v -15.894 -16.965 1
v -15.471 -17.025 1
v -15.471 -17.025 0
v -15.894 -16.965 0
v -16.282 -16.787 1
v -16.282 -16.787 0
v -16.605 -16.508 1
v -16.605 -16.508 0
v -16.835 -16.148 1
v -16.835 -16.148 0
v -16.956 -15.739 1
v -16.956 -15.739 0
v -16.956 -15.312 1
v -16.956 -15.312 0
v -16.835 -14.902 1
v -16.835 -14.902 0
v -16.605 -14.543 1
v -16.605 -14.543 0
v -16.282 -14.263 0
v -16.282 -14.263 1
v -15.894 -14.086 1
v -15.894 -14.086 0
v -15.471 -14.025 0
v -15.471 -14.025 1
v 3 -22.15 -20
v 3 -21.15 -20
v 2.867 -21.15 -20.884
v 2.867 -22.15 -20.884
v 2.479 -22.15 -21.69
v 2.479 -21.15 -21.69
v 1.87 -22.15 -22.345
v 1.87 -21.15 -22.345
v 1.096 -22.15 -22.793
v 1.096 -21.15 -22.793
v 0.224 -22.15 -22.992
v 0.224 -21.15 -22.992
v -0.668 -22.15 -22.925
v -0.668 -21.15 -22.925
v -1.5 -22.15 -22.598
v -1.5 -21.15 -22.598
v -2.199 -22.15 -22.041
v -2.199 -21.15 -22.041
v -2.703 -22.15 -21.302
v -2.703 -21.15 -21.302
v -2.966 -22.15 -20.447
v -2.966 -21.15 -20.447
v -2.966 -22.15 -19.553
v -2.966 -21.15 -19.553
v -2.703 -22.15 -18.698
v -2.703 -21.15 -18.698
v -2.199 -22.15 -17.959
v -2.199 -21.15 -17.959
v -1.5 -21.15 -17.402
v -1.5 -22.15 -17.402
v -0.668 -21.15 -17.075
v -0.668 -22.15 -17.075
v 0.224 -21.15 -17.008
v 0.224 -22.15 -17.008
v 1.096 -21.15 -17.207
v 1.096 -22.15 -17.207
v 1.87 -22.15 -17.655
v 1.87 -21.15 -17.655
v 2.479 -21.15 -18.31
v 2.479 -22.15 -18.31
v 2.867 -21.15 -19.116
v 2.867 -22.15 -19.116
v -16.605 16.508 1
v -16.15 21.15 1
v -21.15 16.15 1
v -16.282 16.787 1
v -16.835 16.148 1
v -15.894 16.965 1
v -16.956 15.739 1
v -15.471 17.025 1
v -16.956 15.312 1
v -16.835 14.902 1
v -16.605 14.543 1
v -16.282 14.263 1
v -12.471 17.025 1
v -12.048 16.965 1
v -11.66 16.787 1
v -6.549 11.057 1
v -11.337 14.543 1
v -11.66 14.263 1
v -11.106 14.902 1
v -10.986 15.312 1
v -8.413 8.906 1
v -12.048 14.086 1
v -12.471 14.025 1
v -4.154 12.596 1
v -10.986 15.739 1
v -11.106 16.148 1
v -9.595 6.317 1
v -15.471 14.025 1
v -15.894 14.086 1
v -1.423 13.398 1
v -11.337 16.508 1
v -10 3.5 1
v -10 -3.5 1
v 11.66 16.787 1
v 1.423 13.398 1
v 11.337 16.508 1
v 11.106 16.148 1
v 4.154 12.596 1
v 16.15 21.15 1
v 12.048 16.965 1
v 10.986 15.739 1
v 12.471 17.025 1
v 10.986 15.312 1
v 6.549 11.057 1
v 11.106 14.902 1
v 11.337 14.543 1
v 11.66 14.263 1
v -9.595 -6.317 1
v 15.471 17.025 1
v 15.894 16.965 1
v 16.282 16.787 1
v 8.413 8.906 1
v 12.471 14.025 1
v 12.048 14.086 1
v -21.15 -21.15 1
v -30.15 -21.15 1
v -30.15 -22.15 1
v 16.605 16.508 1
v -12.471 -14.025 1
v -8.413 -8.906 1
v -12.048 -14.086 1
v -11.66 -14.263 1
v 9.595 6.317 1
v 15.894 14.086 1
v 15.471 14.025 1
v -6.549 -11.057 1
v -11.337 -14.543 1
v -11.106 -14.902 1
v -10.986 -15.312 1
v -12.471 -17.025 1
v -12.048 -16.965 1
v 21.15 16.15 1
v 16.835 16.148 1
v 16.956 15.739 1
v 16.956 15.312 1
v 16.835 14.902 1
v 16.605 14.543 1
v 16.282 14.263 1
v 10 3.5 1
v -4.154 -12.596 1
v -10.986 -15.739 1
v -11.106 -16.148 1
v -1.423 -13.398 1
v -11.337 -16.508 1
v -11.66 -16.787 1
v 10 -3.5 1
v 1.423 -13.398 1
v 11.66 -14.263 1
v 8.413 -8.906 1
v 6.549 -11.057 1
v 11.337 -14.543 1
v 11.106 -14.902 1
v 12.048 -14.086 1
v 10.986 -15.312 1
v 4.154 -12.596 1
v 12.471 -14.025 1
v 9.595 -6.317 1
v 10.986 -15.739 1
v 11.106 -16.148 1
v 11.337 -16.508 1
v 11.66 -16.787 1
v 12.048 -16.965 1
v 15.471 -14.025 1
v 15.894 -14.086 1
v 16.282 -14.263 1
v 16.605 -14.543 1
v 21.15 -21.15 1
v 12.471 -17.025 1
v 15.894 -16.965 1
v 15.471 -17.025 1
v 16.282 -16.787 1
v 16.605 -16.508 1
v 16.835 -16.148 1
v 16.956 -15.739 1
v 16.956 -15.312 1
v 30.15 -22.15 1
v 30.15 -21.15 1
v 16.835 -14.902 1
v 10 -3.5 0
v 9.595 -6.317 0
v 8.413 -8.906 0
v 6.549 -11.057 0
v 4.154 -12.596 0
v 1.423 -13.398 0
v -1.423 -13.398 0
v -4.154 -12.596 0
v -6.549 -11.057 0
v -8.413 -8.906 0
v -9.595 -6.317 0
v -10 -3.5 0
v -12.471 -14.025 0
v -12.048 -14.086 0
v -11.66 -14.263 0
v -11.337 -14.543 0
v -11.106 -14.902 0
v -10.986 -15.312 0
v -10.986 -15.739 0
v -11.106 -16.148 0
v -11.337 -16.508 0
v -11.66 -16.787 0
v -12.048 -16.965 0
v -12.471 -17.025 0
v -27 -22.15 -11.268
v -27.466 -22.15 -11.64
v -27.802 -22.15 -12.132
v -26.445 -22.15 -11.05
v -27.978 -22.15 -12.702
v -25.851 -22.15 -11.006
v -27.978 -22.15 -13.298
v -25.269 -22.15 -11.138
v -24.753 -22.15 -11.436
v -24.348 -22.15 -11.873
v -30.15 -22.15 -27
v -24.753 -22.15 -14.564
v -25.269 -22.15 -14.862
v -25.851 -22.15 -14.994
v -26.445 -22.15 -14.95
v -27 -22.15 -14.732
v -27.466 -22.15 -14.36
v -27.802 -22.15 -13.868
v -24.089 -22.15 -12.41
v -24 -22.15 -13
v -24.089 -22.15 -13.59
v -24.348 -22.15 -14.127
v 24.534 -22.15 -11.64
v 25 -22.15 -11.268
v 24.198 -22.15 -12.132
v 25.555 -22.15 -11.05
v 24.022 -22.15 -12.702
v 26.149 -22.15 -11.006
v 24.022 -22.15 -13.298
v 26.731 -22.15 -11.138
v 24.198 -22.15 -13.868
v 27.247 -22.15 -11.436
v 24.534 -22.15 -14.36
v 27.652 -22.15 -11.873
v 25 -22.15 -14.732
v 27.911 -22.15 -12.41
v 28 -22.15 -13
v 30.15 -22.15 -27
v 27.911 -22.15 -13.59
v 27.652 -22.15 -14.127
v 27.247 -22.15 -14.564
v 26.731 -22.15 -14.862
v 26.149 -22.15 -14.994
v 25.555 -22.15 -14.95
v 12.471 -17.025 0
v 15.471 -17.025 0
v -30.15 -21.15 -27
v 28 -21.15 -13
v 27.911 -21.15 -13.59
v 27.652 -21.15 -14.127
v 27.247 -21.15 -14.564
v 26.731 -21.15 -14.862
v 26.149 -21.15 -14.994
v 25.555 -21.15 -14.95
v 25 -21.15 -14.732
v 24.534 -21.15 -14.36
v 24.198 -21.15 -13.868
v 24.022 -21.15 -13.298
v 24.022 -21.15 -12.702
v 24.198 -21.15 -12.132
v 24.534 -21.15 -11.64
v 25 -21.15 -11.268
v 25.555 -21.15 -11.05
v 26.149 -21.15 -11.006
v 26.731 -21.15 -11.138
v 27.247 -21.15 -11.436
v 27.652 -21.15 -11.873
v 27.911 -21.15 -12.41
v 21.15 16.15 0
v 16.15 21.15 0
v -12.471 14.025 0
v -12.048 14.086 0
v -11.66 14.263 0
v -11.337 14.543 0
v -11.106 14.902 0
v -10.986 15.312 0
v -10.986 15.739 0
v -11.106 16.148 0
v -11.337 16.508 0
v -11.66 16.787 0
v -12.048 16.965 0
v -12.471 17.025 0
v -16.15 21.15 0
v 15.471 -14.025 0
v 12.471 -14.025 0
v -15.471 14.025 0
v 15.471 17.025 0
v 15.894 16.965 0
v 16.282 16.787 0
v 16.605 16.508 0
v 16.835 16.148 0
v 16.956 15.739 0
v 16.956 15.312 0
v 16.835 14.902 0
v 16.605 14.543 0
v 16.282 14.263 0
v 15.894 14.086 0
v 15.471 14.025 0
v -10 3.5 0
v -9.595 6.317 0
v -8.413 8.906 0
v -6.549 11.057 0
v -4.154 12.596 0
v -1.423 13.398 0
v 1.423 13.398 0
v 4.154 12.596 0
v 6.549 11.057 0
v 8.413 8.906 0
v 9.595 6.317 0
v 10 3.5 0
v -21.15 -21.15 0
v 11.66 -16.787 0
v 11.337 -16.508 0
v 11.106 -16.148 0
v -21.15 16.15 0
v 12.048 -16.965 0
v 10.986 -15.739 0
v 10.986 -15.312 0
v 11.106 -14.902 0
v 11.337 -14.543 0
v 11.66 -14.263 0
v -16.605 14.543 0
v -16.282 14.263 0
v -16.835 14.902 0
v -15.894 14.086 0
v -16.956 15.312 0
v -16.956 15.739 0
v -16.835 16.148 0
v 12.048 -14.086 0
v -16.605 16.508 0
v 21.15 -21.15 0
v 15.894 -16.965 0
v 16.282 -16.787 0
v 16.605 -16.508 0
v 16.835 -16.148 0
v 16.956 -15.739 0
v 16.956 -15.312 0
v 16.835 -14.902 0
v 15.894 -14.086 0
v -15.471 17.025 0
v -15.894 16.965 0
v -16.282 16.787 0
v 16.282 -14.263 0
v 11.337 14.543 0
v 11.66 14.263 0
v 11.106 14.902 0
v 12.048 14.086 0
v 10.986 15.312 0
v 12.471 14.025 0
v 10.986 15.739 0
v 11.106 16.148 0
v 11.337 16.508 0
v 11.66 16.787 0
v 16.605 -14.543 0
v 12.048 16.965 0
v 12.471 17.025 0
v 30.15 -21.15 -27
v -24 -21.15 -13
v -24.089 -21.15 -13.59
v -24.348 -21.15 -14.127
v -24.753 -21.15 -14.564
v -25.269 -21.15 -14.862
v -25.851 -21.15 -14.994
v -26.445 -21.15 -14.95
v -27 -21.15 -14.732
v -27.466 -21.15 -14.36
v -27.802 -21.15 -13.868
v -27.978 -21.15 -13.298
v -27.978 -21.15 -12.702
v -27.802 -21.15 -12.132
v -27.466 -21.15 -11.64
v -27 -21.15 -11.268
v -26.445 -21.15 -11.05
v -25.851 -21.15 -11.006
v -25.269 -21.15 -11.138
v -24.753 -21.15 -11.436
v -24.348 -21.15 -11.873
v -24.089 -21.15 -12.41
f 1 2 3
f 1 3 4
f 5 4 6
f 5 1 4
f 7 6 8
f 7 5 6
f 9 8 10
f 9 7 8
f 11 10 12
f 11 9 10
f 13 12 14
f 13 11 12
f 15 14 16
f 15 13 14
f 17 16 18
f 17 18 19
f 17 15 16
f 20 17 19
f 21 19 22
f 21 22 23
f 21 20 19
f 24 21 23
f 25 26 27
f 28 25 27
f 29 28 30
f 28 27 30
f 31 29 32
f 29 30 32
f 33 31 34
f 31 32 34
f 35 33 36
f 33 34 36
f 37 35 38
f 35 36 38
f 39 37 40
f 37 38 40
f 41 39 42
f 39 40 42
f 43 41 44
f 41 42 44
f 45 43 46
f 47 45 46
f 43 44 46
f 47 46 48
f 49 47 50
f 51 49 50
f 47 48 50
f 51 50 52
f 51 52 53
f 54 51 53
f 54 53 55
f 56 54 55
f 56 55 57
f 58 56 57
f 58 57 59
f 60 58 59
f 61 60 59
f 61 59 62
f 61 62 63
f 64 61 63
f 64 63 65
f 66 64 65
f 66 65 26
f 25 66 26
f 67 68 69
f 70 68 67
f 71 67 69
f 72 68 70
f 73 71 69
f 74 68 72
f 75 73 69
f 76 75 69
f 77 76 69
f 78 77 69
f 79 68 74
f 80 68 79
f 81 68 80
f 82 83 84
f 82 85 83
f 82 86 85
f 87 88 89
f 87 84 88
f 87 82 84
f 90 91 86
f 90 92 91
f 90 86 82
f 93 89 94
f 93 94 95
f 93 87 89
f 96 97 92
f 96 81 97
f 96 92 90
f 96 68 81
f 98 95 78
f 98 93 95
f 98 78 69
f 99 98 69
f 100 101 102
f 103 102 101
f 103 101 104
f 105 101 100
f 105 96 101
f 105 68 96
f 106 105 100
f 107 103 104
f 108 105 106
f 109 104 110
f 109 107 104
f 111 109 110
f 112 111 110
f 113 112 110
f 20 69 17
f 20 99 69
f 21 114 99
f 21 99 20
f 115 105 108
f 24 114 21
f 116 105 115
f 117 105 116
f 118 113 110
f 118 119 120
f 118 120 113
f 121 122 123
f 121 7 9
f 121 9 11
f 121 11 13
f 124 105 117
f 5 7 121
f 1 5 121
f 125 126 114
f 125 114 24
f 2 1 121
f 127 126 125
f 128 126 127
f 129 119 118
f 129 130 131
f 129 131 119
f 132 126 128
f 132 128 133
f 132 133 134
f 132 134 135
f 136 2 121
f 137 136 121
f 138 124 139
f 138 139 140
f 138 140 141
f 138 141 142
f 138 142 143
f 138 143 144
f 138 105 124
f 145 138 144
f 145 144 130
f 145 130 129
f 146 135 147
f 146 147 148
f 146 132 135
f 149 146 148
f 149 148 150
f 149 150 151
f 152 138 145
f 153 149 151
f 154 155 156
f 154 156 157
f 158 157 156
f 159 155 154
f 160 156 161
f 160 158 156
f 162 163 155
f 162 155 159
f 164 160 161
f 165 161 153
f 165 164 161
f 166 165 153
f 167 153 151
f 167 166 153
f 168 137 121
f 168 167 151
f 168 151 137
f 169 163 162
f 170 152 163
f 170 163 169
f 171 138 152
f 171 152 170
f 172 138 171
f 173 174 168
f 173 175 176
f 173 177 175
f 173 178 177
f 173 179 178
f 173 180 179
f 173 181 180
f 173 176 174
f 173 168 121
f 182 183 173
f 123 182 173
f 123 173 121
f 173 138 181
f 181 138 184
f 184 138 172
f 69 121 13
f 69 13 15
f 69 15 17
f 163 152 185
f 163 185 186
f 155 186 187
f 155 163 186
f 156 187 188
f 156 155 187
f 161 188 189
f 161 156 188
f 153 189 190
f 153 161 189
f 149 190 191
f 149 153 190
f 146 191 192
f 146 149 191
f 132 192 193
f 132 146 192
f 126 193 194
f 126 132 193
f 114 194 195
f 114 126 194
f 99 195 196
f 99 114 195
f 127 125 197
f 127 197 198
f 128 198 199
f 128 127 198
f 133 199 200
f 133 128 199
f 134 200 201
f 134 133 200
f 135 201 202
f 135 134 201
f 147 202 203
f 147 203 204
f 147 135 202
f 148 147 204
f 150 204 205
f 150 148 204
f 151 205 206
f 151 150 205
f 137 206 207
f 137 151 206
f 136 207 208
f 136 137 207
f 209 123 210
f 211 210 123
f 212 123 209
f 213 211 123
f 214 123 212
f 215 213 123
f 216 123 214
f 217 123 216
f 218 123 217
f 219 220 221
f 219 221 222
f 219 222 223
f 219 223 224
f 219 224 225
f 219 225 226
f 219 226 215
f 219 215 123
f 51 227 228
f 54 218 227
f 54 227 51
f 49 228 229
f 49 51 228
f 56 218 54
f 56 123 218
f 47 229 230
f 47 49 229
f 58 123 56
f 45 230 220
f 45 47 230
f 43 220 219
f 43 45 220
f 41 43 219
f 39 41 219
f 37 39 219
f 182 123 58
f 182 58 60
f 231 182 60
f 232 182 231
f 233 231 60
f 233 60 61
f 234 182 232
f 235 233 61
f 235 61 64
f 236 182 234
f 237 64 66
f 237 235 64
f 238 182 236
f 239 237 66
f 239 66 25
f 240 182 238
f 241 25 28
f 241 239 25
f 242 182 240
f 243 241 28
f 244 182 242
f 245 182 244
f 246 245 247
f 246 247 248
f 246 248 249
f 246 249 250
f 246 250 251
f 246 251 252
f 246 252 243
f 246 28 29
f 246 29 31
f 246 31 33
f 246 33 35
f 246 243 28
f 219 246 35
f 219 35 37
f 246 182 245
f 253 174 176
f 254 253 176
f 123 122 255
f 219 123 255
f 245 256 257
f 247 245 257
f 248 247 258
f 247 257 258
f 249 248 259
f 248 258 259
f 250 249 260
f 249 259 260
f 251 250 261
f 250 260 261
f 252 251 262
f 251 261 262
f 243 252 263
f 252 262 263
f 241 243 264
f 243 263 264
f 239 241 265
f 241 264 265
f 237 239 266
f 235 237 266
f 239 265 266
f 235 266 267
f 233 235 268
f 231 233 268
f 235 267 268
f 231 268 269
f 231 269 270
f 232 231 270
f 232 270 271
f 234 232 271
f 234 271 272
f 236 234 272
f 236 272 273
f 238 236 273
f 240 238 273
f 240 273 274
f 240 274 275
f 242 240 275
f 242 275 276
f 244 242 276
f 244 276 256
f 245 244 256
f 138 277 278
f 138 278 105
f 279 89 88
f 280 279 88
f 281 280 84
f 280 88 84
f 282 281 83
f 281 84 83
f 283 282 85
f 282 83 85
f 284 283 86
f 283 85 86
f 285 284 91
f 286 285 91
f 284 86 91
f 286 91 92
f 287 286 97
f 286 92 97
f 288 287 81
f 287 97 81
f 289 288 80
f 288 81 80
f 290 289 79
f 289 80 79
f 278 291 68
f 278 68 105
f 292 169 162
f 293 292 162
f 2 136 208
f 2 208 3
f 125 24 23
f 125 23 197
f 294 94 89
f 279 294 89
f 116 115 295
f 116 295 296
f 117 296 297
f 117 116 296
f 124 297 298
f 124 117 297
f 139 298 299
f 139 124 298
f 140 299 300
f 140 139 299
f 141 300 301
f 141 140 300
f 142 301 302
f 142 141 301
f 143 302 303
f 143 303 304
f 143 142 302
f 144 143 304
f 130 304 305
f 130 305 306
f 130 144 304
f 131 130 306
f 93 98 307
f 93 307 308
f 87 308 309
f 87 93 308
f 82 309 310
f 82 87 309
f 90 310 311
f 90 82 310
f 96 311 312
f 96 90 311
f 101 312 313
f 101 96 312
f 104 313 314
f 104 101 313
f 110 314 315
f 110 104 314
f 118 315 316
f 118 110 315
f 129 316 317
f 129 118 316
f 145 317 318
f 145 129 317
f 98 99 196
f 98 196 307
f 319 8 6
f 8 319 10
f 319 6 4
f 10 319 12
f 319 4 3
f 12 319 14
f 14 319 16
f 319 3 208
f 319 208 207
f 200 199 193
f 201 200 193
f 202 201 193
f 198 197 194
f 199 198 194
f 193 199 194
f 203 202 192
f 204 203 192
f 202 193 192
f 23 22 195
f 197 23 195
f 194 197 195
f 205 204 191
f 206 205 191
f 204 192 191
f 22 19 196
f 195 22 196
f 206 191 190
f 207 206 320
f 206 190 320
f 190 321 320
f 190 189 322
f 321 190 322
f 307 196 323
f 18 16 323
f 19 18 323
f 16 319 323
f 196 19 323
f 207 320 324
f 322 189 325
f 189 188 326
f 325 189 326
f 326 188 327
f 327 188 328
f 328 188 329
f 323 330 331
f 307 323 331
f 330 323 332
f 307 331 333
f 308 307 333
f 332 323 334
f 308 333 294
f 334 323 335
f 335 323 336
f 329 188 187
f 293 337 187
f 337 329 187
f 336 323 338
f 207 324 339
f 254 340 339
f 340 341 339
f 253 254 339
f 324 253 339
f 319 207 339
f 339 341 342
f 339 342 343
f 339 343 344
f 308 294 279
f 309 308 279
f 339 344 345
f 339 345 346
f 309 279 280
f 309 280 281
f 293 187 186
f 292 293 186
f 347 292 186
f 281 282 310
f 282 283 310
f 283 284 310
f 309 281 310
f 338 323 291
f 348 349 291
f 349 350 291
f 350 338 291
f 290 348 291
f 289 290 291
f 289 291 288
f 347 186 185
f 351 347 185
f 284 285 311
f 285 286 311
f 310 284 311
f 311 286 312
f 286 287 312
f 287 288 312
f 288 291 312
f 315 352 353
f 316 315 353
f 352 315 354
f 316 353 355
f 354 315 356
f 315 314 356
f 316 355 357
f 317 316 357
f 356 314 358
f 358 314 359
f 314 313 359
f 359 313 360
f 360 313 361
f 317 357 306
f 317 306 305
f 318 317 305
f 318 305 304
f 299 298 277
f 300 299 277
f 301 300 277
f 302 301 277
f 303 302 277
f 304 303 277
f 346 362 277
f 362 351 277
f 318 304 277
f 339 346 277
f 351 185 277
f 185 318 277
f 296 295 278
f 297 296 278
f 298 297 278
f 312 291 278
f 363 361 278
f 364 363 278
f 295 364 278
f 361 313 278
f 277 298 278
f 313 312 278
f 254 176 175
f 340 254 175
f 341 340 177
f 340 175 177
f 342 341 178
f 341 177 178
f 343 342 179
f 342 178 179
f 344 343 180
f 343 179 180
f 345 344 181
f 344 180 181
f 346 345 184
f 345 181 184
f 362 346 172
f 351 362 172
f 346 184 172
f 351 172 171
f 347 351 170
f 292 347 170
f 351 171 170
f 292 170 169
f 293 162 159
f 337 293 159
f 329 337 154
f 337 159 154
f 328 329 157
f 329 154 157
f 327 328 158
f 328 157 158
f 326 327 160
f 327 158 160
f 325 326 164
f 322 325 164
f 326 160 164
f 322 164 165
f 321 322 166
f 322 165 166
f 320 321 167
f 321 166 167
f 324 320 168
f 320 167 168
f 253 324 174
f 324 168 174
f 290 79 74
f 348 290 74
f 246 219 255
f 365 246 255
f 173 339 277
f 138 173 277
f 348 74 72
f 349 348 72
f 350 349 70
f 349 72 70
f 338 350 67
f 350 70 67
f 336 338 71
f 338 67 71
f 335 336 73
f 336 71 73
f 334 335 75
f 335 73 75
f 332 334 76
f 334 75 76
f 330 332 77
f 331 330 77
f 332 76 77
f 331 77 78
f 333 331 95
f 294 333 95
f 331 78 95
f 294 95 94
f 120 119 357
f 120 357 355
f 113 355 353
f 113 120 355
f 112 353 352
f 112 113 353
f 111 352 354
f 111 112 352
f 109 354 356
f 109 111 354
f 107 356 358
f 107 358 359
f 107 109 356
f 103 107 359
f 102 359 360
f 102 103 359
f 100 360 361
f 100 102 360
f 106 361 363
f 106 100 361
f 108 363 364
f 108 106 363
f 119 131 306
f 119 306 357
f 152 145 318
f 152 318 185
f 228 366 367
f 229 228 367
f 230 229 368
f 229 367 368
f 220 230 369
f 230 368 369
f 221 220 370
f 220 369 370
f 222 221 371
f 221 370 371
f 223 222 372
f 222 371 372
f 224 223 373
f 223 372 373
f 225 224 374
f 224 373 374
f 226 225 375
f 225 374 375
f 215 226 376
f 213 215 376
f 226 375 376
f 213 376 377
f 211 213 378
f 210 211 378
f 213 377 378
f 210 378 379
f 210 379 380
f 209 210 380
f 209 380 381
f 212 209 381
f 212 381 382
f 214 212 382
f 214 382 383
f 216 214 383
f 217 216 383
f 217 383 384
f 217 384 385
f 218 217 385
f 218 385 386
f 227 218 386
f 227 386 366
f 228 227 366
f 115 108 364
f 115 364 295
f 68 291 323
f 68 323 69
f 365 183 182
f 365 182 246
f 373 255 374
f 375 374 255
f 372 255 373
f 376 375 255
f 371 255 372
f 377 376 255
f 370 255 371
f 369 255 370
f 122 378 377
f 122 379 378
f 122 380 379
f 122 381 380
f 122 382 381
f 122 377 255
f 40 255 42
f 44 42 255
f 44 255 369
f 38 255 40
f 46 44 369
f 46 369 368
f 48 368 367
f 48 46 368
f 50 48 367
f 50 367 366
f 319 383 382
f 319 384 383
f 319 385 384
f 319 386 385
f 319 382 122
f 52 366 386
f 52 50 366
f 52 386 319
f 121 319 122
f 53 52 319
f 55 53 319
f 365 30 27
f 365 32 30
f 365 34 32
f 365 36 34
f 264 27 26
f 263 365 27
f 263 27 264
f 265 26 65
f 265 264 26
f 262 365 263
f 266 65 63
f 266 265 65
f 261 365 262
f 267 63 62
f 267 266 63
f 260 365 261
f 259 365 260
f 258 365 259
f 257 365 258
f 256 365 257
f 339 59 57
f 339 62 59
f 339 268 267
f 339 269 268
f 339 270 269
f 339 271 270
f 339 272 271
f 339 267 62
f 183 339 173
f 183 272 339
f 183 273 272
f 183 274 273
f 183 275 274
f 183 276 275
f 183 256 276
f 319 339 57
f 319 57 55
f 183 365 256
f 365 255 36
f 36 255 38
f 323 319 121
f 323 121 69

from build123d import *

# Parameters (mm, degrees)
SKETCH1_W                = 42.3
SKETCH1_H                = 42.3
BOSS_EXTRUDE1_DEPTH      = 1
SKETCH2_W                = 42.3
SKETCH2_H                = 1
BOSS_EXTRUDE2_DEPTH      = 10
CUT_EXTRUDE2_DEPTH       = 1
CUT_EXTRUDE4_DEPTH       = 10
MIRROR2_COPY_1_DEPTH     = 1
CHAMFER1_SIZE            = 5
SKETCH8_W                = 42.3
SKETCH8_H                = 1
BOSS_EXTRUDE3_DEPTH      = 27
BOSS_EXTRUDE3_DEPTH_BACK = 1
SKETCH5_R                = 3
CUT_EXTRUDE3_DEPTH       = 22
CUT_EXTRUDE5_REACH       = 44.3
SKETCH9_W                = 10
SKETCH9_H                = 1
BOSS_EXTRUDE4_DEPTH      = 9
SKETCH11_R               = 2
CUT_EXTRUDE6_DEPTH       = 10
SKETCH15_R               = 3
CUT_EXTRUDE8_DEPTH       = 10


with BuildPart() as part:
    # Sketch1 → Boss-Extrude1 (new body)
    with BuildSketch(Plane.XY):
        Rectangle(SKETCH1_W, SKETCH1_H)
    extrude(amount=BOSS_EXTRUDE1_DEPTH)

    # Sketch2 → Boss-Extrude2 (add)
    with BuildSketch(Plane.XY.offset(1)):
        with Locations((0, -20.65)):
            Rectangle(SKETCH2_W, SKETCH2_H)
    extrude(amount=BOSS_EXTRUDE2_DEPTH)

    # Sketch3 → Cut-Extrude2 (cut)
    with BuildSketch(Plane.XY.offset(1)):
        with BuildLine():
            Line((-15.470931569, -14.025299874), (-12.470931569, -14.025299874))
            ThreePointArc((-12.470931569, -14.025299874), (-10.970931569, -15.525299874), (-12.470931569, -17.025299874))
            Line((-12.470931569, -17.025299874), (-15.470931569, -17.025299874))
            ThreePointArc((-15.470931569, -17.025299874), (-16.970931569, -15.525299874), (-15.470931569, -14.025299874))
        make_face()
    cut_extrude2 = extrude(amount=-CUT_EXTRUDE2_DEPTH, mode=Mode.SUBTRACT)

    # Mirror1: Cut-Extrude2 across plane
    add(cut_extrude2.mirror(Plane(origin=(0, 0, 0), x_dir=(0, 0, 1), z_dir=(1, 0, 0))), mode=Mode.SUBTRACT)

    # Sketch6 → Cut-Extrude4 (cut)
    with BuildSketch(Plane.XY.offset(1)):
        with BuildLine():
            Line((10, 3.5), (10, -3.5))
            ThreePointArc((10, -3.5), (0, -13.5), (-10, -3.5))
            Line((-10, -3.5), (-10, 3.5))
            ThreePointArc((-10, 3.5), (0, 13.5), (10, 3.5))
        make_face()
    extrude(amount=-CUT_EXTRUDE4_DEPTH, mode=Mode.SUBTRACT)

    # Mirror2: Cut-Extrude2 across plane
    add(cut_extrude2.mirror(Plane.ZX), mode=Mode.SUBTRACT)

    # Mirror2 copy 1 sketch → Mirror2 copy 1 (cut)
    with BuildSketch(Plane(origin=(0, 0, 1), x_dir=(-1, 0, 0), z_dir=(0, 0, 1))):
        with BuildLine():
            Line((-15.470931569, -14.025299874), (-12.470931569, -14.025299874))
            ThreePointArc((-12.470931569, -14.025299874), (-10.970931569, -15.525299874), (-12.470931569, -17.025299874))
            Line((-12.470931569, -17.025299874), (-15.470931569, -17.025299874))
            ThreePointArc((-15.470931569, -17.025299874), (-16.970931569, -15.525299874), (-15.470931569, -14.025299874))
        make_face()
    extrude(amount=-MIRROR2_COPY_1_DEPTH, mode=Mode.SUBTRACT)

    # Chamfer1
    chamfer1_edges = [part.edges().sort_by_distance(p)[0] for p in [
        (-21.15, 21.15, 0.5),
        (21.15, 21.15, 0.5),
    ]]
    chamfer(chamfer1_edges, length=CHAMFER1_SIZE)

    # Sketch8 → Boss-Extrude3 (add, two sides)
    with BuildSketch(Plane(origin=(0, 0, 0), x_dir=(-1, 0, 0), z_dir=(0, 0, -1))) as boss_extrude3_sk:
        with Locations((0, -21.65)):
            Rectangle(SKETCH8_W, SKETCH8_H)
    extrude(amount=BOSS_EXTRUDE3_DEPTH)
    extrude(boss_extrude3_sk.sketch, amount=-BOSS_EXTRUDE3_DEPTH_BACK)

    # Sketch5 → Cut-Extrude3 (cut)
    with BuildSketch(Plane(origin=(0, -20.15, 0), x_dir=(1, 0, 0), z_dir=(0, 1, 0))):
        with Locations((0, -6)):
            Circle(SKETCH5_R)
    extrude(amount=-CUT_EXTRUDE3_DEPTH, mode=Mode.SUBTRACT)

    # Sketch9 → Cut-Extrude5 (cut, up to next)
    with BuildSketch(Plane(origin=(21.15, 0, 0), x_dir=(0, 0, -1), z_dir=(1, 0, 0)), mode=Mode.PRIVATE) as cut_extrude5_sk1:
        with Locations((-6, -20.65)):
            Rectangle(SKETCH9_W, SKETCH9_H)
    cut_extrude5_tool1 = extrude(cut_extrude5_sk1.sketch, amount=-CUT_EXTRUDE5_REACH, mode=Mode.PRIVATE) & part.part
    add(cut_extrude5_tool1.solids().sort_by_distance((21.15, -20.65, 6))[0], mode=Mode.SUBTRACT)

    # Sketch10 → Boss-Extrude4 (add)
    with BuildSketch(Plane(origin=(21.15, 0, 0), x_dir=(0, 0, -1), z_dir=(1, 0, 0))):
        Polygon((0, -21.15), (-1, -21.15), (-1, -22.15), (0, -22.15), (27, -22.15), (27, -21.15), align=None)
    boss_extrude4 = extrude(amount=BOSS_EXTRUDE4_DEPTH)

    # Mirror3: Boss-Extrude4 across plane
    add(boss_extrude4.mirror(Plane(origin=(0, 0, 0), x_dir=(0, 0, 1), z_dir=(1, 0, 0))))

    # Sketch11 → Cut-Extrude6 (cut)
    with BuildSketch(Plane(origin=(0, -21.15, 0), x_dir=(1, 0, 0), z_dir=(0, 1, 0))):
        with Locations((26, 13)):
            Circle(SKETCH11_R)
        with Locations((-26, 13)):
            Circle(SKETCH11_R)
    extrude(amount=-CUT_EXTRUDE6_DEPTH, mode=Mode.SUBTRACT)

    # Sketch15 → Cut-Extrude8 (cut)
    with BuildSketch(Plane(origin=(0, -21.15, 0), x_dir=(1, 0, 0), z_dir=(0, 1, 0))):
        with Locations((0, 20)):
            Circle(SKETCH15_R)
    extrude(amount=-CUT_EXTRUDE8_DEPTH, mode=Mode.SUBTRACT)


solid = part.part
